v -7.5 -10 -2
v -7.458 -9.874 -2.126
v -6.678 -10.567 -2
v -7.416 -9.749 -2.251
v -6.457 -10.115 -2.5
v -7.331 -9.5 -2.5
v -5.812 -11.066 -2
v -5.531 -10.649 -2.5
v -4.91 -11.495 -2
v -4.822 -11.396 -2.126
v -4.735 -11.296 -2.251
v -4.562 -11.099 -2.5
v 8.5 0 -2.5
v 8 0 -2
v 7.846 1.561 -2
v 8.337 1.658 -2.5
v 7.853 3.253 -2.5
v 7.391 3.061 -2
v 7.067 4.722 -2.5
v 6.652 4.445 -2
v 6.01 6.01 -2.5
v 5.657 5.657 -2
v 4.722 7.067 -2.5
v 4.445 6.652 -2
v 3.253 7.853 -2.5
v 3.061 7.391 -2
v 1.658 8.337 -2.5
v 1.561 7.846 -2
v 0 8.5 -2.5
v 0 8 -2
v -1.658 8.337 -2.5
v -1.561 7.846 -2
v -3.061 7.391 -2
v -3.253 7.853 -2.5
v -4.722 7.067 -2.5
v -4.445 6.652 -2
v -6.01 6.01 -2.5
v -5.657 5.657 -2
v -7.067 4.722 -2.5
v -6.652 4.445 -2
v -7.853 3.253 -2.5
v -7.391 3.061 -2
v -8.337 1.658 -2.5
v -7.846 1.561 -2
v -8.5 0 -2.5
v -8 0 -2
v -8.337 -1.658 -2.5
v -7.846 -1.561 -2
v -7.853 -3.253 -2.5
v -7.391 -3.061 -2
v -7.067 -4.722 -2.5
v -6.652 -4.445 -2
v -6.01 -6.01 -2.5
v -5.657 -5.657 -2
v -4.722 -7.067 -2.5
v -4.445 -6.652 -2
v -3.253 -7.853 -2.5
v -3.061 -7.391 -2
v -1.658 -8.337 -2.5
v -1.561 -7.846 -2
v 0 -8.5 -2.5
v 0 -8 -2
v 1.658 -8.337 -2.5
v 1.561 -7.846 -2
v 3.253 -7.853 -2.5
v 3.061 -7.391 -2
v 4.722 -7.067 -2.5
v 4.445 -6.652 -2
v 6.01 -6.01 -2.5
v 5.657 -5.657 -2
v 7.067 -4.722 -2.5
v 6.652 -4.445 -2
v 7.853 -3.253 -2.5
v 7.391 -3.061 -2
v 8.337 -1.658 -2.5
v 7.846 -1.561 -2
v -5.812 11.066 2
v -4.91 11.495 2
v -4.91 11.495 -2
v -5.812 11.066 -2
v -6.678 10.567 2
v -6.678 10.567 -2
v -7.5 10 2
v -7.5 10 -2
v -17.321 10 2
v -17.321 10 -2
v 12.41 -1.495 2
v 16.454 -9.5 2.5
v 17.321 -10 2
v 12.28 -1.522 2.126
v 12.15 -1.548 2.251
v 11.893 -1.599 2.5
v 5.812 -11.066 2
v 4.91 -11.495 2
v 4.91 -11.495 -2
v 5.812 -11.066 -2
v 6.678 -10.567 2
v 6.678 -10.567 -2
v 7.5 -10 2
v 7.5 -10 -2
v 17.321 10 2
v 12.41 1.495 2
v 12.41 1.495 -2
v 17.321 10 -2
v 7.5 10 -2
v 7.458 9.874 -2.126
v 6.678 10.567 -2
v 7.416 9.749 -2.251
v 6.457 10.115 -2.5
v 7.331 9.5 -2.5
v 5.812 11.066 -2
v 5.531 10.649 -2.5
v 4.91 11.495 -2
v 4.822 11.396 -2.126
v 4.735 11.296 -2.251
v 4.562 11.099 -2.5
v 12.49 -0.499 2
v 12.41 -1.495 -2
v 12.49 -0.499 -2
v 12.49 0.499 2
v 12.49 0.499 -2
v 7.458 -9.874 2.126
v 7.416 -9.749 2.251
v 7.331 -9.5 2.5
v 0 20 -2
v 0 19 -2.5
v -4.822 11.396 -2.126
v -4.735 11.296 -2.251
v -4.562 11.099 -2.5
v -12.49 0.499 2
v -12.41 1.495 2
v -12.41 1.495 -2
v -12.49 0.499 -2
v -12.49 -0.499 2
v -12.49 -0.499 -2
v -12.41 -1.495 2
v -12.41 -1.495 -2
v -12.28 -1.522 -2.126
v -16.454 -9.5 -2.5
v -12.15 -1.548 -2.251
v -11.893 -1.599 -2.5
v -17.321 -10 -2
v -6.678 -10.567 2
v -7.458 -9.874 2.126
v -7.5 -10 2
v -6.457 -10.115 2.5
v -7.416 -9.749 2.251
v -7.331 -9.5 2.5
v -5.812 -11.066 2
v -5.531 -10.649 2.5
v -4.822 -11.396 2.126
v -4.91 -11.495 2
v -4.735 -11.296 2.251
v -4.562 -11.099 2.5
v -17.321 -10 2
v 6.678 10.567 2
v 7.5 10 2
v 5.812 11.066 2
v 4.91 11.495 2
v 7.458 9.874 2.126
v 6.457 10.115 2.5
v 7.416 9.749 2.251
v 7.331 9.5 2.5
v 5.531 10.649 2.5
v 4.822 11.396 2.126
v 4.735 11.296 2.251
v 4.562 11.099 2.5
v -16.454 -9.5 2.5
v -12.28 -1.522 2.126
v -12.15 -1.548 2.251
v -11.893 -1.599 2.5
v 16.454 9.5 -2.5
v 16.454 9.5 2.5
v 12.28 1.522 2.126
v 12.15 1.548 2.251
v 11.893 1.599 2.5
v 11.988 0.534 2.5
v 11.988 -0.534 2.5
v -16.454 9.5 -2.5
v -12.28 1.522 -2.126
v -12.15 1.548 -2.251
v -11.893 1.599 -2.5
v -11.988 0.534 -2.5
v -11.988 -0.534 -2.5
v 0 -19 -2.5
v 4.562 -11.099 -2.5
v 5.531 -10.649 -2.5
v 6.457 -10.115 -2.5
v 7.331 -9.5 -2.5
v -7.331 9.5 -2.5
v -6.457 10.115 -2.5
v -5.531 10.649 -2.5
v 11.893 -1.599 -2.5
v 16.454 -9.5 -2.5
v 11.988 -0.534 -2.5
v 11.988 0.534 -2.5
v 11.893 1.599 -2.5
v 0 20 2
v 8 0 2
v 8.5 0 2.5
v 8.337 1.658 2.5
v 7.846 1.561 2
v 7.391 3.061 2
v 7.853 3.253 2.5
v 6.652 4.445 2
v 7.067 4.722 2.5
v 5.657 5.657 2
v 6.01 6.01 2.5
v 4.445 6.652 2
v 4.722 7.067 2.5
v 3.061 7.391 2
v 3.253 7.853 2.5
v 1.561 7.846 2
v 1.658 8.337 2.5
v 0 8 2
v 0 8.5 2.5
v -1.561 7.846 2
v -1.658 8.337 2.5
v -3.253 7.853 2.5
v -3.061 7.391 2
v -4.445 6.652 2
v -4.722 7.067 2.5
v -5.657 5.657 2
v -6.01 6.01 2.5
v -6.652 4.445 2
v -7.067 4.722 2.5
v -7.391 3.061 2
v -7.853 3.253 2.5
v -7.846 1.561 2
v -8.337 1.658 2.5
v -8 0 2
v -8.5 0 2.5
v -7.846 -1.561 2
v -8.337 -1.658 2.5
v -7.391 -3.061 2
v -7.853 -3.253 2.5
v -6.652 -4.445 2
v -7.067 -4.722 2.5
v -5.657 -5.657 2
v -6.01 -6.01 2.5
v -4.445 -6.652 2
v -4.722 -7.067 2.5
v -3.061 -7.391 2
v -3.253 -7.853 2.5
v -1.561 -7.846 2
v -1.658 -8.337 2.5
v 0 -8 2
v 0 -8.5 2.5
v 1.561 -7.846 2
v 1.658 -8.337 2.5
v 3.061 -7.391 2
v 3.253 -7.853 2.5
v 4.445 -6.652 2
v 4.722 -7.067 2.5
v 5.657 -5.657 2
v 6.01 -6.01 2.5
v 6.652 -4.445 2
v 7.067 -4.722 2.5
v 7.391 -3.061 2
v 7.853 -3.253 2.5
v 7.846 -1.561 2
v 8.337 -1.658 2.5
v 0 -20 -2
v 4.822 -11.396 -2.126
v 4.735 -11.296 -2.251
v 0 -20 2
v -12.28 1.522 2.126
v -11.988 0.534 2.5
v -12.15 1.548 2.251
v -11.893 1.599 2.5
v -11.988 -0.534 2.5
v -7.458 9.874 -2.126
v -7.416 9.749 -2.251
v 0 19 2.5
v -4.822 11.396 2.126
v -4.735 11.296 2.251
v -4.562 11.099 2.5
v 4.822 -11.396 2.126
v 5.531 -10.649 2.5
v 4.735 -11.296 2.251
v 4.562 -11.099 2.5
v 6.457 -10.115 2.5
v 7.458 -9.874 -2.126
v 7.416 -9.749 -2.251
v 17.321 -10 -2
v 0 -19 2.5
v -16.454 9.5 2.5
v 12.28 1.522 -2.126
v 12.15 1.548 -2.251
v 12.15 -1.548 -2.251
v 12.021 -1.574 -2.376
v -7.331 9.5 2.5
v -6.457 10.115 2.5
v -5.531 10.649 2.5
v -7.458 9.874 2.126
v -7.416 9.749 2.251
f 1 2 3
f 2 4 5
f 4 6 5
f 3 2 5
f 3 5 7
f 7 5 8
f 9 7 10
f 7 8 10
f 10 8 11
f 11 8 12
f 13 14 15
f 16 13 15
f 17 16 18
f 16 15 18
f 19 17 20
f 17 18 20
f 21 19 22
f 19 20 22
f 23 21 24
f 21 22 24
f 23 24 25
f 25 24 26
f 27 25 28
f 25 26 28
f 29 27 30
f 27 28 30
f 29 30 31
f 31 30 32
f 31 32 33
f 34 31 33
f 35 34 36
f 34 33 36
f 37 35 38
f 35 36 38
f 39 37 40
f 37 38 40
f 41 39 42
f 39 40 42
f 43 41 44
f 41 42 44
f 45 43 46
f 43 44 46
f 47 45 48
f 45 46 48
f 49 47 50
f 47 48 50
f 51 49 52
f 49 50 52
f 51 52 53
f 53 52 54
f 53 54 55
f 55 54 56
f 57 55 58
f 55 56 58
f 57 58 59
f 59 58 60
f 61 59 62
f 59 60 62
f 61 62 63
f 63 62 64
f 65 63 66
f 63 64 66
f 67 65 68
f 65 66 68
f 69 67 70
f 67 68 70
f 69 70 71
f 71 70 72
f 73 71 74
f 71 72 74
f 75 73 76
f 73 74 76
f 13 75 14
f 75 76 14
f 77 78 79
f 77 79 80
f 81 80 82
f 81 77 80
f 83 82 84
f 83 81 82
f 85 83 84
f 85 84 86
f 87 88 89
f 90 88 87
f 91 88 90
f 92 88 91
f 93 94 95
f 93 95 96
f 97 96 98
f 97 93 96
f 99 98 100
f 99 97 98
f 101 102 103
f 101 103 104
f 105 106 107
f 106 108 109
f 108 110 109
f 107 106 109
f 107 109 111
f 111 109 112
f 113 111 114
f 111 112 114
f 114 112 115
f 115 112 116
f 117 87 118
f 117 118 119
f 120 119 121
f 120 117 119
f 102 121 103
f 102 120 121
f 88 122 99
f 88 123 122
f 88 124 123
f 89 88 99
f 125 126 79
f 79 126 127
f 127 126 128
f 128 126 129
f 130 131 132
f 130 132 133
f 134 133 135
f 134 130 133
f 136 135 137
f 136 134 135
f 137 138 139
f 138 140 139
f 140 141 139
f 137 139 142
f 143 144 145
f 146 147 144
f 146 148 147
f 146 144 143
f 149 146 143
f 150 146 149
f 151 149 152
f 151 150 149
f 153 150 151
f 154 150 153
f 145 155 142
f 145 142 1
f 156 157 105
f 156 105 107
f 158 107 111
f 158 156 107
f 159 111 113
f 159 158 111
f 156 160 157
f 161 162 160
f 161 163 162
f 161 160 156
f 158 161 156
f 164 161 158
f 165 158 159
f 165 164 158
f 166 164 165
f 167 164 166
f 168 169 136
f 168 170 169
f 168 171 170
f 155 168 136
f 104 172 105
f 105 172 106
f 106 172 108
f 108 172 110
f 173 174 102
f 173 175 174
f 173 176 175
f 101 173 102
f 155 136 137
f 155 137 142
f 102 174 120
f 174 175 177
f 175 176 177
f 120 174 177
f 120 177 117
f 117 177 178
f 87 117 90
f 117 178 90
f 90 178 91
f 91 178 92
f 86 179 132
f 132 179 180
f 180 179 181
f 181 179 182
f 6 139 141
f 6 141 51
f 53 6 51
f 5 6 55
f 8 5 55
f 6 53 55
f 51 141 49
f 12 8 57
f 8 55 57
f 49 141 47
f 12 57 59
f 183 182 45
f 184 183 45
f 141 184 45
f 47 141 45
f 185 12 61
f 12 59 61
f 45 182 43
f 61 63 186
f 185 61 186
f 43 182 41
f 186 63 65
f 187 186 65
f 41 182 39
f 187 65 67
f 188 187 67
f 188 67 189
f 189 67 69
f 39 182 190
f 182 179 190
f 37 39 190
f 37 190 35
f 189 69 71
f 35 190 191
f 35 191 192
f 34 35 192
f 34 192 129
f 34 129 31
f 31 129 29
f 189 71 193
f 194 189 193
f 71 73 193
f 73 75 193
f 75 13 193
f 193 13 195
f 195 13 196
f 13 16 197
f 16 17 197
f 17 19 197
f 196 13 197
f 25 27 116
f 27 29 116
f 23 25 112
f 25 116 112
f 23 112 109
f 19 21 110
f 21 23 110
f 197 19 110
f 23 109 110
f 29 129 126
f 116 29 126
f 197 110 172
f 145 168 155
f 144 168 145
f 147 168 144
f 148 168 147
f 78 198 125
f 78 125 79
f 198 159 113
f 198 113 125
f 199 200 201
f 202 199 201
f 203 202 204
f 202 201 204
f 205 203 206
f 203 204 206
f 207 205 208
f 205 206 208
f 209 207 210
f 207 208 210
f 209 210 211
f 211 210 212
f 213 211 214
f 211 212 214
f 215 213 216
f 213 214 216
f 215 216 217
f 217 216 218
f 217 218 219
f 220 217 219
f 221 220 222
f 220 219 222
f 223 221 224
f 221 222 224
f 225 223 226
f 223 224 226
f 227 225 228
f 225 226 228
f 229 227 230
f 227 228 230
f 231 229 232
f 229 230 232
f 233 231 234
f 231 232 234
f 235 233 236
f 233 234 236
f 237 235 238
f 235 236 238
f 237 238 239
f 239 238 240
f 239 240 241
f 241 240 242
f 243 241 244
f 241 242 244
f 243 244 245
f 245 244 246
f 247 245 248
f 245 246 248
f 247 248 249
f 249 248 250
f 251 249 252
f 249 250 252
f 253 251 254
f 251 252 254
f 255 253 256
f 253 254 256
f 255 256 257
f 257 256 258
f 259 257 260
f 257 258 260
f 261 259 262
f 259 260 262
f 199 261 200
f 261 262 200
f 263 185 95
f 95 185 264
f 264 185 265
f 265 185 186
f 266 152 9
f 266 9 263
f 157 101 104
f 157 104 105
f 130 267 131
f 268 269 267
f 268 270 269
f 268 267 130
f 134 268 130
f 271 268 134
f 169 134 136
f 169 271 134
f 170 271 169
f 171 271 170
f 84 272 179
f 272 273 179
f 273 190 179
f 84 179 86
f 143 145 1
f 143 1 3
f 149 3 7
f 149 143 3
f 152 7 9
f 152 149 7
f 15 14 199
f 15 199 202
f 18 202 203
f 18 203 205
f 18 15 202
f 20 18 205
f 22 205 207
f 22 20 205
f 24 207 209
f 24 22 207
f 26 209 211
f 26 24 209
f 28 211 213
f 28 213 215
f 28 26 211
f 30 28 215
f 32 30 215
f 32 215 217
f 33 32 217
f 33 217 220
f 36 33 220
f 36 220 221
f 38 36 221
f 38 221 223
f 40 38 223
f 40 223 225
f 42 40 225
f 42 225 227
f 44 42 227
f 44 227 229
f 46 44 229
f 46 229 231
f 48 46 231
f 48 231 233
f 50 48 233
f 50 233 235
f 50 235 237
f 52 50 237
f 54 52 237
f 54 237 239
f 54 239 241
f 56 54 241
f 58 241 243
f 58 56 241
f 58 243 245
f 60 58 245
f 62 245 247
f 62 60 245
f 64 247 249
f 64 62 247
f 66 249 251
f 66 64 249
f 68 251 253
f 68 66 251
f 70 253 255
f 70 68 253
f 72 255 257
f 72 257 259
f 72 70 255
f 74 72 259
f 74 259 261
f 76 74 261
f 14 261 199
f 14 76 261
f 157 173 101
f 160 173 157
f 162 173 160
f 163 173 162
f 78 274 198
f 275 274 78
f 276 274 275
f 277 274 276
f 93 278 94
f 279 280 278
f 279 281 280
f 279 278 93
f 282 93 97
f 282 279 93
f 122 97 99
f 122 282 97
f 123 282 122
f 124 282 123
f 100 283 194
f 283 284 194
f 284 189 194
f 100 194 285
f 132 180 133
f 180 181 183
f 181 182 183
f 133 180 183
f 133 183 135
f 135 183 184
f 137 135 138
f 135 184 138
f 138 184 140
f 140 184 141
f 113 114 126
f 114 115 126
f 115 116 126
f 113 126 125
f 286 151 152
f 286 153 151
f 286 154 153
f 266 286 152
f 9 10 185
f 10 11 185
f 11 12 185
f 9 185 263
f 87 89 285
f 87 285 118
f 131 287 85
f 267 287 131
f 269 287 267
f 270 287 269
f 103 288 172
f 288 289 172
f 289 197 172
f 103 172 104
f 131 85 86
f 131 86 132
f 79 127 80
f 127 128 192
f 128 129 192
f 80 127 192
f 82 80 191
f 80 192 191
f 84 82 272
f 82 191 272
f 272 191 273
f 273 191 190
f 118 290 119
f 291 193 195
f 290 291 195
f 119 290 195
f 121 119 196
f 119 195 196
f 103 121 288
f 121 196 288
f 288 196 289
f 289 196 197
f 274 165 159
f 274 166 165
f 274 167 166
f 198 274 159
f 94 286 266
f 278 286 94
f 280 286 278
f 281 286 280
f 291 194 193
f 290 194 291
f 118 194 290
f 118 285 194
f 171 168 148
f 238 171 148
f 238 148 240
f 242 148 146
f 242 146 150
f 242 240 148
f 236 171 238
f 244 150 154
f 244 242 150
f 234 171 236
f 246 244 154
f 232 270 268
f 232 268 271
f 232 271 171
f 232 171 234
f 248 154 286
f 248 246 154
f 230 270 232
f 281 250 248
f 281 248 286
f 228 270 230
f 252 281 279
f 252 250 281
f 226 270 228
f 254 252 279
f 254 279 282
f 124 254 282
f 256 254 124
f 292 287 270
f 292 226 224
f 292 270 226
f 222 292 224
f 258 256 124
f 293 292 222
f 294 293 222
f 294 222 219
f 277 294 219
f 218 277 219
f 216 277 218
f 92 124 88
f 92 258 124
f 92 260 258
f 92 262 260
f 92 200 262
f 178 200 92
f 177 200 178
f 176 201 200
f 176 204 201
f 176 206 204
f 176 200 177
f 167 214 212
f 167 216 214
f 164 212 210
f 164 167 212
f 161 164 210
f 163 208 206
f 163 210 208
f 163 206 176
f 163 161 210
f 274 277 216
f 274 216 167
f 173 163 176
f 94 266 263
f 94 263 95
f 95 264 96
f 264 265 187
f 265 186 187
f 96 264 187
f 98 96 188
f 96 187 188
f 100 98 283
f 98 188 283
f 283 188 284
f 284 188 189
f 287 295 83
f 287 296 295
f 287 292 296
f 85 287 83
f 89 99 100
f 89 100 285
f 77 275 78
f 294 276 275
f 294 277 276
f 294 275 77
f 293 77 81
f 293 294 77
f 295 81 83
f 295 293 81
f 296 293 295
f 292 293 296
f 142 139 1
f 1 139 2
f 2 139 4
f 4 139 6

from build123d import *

# Parameters (mm, degrees)
F0_R     = 12.5
F0_R_2   = 8
F1_DEPTH = 2.5
F3_DEPTH = 5
F4_SIZE  = 0.5


with BuildPart() as f1:
    # F0 (on Top) → F1 (new body, symmetric)
    with BuildSketch(Plane.XY):
        Circle(F0_R)
        Circle(F0_R_2, mode=Mode.SUBTRACT)
    extrude(amount=F1_DEPTH, both=True)

    # F2 (on face) → F3 (join)
    with BuildSketch(Plane.XY.offset(2.5)):
        with BuildLine():
            ThreePointArc((-4.9102540378, 11.4951905284), (-2.5060046284, 12.2462214908), (0, 12.5))
            Line((0, 12.5), (0, 20))
            Line((0, 20), (-4.9102540378, 11.4951905284))
        make_face()
        with BuildLine():
            Line((0, 20), (0, 12.5))
            ThreePointArc((0, 12.5), (2.5060046284, 12.2462214908), (4.9102540378, 11.4951905284))
            Line((4.9102540378, 11.4951905284), (0, 20))
        make_face()
        with BuildLine():
            Line((17.3205080757, 10), (7.5, 10))
            ThreePointArc((7.5, 10), (10.8253175473, 6.25), (12.4102540378, 1.4951905284))
            Line((12.4102540378, 1.4951905284), (17.3205080757, 10))
        make_face()
        with BuildLine():
            ThreePointArc((-12.4102540378, 1.4951905284), (-10.8253175473, 6.25), (-7.5, 10))
            Line((-7.5, 10), (-17.3205080757, 10))
            Line((-17.3205080757, 10), (-12.4102540378, 1.4951905284))
        make_face()
        with BuildLine():
            ThreePointArc((-7.5, -10), (-10.8253175473, -6.25), (-12.4102540378, -1.4951905284))
            Line((-12.4102540378, -1.4951905284), (-17.3205080757, -10))
            Line((-17.3205080757, -10), (-7.5, -10))
        make_face()
        with BuildLine():
            Line((17.3205080757, -10), (12.4102540378, -1.4951905284))
            ThreePointArc((12.4102540378, -1.4951905284), (10.8253175473, -6.25), (7.5, -10))
            Line((7.5, -10), (17.3205080757, -10))
        make_face()
        with BuildLine():
            ThreePointArc((4.9102540378, -11.4951905284), (0, -12.5), (-4.9102540378, -11.4951905284))
            Line((-4.9102540378, -11.4951905284), (0, -20))
            Line((0, -20), (4.9102540378, -11.4951905284))
        make_face()
    extrude(amount=-F3_DEPTH)

    # F4
    f4_edges = [f1.edges().sort_by_distance(p)[0] for p in [
        (12.5, 0, 2.5),
        (14.865381, 5.747595, 2.5),
        (12.410254, 10, 2.5),
        (6.25, 10.825318, 2.5),
        (2.455127, 15.747595, 2.5),
        (-2.455127, 15.747595, 2.5),
        (-6.25, 10.825318, 2.5),
        (-12.410254, 10, 2.5),
        (-14.865381, 5.747595, 2.5),
        (-12.5, 0, 2.5),
        (-14.865381, -5.747595, 2.5),
        (-12.410254, -10, 2.5),
        (-6.25, -10.825318, 2.5),
        (-2.455127, -15.747595, 2.5),
        (2.455127, -15.747595, 2.5),
        (6.25, -10.825318, 2.5),
        (12.410254, -10, 2.5),
        (14.865381, -5.747595, 2.5),
        (-8, 0, 2.5),
        (14.865381, 5.747595, -2.5),
        (12.410254, 10, -2.5),
        (6.25, 10.825318, -2.5),
        (2.455127, 15.747595, -2.5),
        (-2.455127, 15.747595, -2.5),
        (-6.25, 10.825318, -2.5),
        (-12.410254, 10, -2.5),
        (-14.865381, 5.747595, -2.5),
        (-12.5, 0, -2.5),
        (-14.865381, -5.747595, -2.5),
        (-12.410254, -10, -2.5),
        (-6.25, -10.825318, -2.5),
        (-2.455127, -15.747595, -2.5),
        (2.455127, -15.747595, -2.5),
        (6.25, -10.825318, -2.5),
        (12.410254, -10, -2.5),
        (14.865381, -5.747595, -2.5),
        (12.5, 0, -2.5),
        (-8, 0, -2.5),
    ]]
    chamfer(f4_edges, length=F4_SIZE)


solid = f1.part
